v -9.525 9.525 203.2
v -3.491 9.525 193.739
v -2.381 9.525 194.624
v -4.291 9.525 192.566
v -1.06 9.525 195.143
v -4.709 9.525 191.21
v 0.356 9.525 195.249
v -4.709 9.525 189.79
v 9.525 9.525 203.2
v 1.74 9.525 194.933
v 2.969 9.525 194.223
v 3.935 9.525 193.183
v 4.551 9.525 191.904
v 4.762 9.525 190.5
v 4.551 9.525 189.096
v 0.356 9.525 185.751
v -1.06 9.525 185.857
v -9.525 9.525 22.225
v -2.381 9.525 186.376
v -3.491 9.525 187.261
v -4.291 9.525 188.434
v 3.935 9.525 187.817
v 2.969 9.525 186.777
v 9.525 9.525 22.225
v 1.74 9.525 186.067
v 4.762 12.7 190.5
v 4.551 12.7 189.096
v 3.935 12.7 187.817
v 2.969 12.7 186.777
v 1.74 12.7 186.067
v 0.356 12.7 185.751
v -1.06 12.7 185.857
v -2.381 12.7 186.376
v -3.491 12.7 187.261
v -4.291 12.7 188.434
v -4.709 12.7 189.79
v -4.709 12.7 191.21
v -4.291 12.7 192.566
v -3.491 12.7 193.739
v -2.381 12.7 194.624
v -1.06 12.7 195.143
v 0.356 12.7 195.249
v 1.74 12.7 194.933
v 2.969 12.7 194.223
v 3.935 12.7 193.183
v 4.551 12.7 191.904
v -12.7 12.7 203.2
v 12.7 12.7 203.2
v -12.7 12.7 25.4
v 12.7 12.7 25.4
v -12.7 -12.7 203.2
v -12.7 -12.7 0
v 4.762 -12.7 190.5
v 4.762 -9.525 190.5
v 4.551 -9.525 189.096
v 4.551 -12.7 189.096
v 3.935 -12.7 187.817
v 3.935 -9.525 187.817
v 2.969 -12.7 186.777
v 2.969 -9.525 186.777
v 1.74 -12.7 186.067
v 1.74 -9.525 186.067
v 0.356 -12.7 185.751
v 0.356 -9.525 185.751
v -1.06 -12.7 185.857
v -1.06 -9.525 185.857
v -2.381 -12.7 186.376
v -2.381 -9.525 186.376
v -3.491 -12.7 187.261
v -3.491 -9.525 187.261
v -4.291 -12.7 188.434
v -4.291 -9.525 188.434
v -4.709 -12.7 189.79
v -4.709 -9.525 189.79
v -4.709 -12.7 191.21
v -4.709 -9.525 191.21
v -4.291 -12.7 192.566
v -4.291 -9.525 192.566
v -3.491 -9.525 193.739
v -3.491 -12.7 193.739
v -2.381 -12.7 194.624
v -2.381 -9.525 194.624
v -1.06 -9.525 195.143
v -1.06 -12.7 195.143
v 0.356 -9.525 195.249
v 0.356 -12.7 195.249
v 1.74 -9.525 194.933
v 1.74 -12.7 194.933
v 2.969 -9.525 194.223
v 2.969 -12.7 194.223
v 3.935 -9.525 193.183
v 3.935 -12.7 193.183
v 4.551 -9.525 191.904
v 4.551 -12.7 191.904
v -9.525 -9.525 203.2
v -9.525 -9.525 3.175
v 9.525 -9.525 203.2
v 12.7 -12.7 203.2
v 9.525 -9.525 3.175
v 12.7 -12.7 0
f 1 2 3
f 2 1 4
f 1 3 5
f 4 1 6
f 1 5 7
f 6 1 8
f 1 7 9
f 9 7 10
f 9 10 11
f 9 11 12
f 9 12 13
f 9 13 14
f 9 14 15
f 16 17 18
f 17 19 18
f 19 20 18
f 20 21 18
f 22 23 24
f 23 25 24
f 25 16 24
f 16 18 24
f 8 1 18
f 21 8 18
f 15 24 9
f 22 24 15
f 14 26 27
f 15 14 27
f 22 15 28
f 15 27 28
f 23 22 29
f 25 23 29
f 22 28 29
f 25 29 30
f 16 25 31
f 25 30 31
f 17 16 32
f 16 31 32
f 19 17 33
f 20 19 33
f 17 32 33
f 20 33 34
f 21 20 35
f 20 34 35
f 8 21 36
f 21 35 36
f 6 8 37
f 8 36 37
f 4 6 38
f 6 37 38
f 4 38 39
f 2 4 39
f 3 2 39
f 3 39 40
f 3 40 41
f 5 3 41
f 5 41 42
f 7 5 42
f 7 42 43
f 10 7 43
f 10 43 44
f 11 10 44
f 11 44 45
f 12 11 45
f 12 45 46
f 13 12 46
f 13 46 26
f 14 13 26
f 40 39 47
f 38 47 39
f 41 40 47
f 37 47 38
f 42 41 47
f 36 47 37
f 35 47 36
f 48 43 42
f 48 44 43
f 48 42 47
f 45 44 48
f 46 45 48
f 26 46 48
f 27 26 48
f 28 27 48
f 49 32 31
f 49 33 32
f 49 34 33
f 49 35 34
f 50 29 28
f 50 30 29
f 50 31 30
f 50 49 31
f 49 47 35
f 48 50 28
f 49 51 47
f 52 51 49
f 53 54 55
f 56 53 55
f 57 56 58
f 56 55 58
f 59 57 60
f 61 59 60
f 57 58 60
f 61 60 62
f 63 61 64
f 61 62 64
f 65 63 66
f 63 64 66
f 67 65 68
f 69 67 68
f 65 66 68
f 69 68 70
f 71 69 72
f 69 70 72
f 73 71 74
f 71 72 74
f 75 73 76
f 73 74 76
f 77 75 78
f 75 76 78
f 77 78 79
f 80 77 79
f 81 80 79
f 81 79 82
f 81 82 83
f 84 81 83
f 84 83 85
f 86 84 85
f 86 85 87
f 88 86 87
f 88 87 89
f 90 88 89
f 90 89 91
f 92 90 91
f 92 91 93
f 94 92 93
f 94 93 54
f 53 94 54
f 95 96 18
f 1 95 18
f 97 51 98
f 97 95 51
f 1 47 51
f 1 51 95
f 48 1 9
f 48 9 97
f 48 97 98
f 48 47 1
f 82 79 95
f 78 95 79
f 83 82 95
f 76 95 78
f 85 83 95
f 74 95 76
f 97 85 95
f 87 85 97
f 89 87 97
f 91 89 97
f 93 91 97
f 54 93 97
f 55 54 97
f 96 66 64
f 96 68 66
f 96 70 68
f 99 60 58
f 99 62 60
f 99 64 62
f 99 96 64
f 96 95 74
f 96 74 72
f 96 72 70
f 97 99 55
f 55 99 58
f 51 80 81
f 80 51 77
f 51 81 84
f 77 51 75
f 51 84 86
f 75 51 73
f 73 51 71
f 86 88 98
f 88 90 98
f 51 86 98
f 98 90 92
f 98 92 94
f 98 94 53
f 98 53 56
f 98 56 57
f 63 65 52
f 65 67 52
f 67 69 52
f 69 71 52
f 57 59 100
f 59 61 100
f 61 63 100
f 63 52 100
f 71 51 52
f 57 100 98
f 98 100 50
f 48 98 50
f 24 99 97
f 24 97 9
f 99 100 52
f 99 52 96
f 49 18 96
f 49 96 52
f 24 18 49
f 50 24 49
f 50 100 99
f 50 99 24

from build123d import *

# Parameters (mm, degrees)
SKETCH1_W                    = 25.4
SKETCH1_H                    = 25.4
SKETCH1_W_2                  = 19.05
SKETCH1_H_2                  = 19.05
BOSS_EXTRUDE1_DEPTH          = 203.2
CUT_EXTRUDE1_DEPTH           = 206.174779152
F_3_8_0_375_DIAMETER_HOLE1_D = 9.525


with BuildPart() as part:
    # Sketch1 → Boss-Extrude1 (new body)
    with BuildSketch(Plane.XY):
        Rectangle(SKETCH1_W, SKETCH1_H)
        Rectangle(SKETCH1_W_2, SKETCH1_H_2, mode=Mode.SUBTRACT)
    extrude(amount=BOSS_EXTRUDE1_DEPTH)

    # Sketch2 → Cut-Extrude1 (cut, through all)
    with BuildSketch(Plane(origin=(12.7, 0, 0), x_dir=(0, 0, -1), z_dir=(1, 0, 0))):
        Polygon((0, 12.7), (0, -12.7), (-25.4, 12.7), align=None)
    extrude(amount=-CUT_EXTRUDE1_DEPTH, mode=Mode.SUBTRACT)

    # 3/8 (0.375) Diameter Hole1 (through all)
    with Locations(Plane(origin=(0, -12.7, 0), x_dir=(-1, 0, 0), z_dir=(0, -1, 0))):
        with Locations((0, -190.5)):
            Hole(F_3_8_0_375_DIAMETER_HOLE1_D / 2)


solid = part.part
